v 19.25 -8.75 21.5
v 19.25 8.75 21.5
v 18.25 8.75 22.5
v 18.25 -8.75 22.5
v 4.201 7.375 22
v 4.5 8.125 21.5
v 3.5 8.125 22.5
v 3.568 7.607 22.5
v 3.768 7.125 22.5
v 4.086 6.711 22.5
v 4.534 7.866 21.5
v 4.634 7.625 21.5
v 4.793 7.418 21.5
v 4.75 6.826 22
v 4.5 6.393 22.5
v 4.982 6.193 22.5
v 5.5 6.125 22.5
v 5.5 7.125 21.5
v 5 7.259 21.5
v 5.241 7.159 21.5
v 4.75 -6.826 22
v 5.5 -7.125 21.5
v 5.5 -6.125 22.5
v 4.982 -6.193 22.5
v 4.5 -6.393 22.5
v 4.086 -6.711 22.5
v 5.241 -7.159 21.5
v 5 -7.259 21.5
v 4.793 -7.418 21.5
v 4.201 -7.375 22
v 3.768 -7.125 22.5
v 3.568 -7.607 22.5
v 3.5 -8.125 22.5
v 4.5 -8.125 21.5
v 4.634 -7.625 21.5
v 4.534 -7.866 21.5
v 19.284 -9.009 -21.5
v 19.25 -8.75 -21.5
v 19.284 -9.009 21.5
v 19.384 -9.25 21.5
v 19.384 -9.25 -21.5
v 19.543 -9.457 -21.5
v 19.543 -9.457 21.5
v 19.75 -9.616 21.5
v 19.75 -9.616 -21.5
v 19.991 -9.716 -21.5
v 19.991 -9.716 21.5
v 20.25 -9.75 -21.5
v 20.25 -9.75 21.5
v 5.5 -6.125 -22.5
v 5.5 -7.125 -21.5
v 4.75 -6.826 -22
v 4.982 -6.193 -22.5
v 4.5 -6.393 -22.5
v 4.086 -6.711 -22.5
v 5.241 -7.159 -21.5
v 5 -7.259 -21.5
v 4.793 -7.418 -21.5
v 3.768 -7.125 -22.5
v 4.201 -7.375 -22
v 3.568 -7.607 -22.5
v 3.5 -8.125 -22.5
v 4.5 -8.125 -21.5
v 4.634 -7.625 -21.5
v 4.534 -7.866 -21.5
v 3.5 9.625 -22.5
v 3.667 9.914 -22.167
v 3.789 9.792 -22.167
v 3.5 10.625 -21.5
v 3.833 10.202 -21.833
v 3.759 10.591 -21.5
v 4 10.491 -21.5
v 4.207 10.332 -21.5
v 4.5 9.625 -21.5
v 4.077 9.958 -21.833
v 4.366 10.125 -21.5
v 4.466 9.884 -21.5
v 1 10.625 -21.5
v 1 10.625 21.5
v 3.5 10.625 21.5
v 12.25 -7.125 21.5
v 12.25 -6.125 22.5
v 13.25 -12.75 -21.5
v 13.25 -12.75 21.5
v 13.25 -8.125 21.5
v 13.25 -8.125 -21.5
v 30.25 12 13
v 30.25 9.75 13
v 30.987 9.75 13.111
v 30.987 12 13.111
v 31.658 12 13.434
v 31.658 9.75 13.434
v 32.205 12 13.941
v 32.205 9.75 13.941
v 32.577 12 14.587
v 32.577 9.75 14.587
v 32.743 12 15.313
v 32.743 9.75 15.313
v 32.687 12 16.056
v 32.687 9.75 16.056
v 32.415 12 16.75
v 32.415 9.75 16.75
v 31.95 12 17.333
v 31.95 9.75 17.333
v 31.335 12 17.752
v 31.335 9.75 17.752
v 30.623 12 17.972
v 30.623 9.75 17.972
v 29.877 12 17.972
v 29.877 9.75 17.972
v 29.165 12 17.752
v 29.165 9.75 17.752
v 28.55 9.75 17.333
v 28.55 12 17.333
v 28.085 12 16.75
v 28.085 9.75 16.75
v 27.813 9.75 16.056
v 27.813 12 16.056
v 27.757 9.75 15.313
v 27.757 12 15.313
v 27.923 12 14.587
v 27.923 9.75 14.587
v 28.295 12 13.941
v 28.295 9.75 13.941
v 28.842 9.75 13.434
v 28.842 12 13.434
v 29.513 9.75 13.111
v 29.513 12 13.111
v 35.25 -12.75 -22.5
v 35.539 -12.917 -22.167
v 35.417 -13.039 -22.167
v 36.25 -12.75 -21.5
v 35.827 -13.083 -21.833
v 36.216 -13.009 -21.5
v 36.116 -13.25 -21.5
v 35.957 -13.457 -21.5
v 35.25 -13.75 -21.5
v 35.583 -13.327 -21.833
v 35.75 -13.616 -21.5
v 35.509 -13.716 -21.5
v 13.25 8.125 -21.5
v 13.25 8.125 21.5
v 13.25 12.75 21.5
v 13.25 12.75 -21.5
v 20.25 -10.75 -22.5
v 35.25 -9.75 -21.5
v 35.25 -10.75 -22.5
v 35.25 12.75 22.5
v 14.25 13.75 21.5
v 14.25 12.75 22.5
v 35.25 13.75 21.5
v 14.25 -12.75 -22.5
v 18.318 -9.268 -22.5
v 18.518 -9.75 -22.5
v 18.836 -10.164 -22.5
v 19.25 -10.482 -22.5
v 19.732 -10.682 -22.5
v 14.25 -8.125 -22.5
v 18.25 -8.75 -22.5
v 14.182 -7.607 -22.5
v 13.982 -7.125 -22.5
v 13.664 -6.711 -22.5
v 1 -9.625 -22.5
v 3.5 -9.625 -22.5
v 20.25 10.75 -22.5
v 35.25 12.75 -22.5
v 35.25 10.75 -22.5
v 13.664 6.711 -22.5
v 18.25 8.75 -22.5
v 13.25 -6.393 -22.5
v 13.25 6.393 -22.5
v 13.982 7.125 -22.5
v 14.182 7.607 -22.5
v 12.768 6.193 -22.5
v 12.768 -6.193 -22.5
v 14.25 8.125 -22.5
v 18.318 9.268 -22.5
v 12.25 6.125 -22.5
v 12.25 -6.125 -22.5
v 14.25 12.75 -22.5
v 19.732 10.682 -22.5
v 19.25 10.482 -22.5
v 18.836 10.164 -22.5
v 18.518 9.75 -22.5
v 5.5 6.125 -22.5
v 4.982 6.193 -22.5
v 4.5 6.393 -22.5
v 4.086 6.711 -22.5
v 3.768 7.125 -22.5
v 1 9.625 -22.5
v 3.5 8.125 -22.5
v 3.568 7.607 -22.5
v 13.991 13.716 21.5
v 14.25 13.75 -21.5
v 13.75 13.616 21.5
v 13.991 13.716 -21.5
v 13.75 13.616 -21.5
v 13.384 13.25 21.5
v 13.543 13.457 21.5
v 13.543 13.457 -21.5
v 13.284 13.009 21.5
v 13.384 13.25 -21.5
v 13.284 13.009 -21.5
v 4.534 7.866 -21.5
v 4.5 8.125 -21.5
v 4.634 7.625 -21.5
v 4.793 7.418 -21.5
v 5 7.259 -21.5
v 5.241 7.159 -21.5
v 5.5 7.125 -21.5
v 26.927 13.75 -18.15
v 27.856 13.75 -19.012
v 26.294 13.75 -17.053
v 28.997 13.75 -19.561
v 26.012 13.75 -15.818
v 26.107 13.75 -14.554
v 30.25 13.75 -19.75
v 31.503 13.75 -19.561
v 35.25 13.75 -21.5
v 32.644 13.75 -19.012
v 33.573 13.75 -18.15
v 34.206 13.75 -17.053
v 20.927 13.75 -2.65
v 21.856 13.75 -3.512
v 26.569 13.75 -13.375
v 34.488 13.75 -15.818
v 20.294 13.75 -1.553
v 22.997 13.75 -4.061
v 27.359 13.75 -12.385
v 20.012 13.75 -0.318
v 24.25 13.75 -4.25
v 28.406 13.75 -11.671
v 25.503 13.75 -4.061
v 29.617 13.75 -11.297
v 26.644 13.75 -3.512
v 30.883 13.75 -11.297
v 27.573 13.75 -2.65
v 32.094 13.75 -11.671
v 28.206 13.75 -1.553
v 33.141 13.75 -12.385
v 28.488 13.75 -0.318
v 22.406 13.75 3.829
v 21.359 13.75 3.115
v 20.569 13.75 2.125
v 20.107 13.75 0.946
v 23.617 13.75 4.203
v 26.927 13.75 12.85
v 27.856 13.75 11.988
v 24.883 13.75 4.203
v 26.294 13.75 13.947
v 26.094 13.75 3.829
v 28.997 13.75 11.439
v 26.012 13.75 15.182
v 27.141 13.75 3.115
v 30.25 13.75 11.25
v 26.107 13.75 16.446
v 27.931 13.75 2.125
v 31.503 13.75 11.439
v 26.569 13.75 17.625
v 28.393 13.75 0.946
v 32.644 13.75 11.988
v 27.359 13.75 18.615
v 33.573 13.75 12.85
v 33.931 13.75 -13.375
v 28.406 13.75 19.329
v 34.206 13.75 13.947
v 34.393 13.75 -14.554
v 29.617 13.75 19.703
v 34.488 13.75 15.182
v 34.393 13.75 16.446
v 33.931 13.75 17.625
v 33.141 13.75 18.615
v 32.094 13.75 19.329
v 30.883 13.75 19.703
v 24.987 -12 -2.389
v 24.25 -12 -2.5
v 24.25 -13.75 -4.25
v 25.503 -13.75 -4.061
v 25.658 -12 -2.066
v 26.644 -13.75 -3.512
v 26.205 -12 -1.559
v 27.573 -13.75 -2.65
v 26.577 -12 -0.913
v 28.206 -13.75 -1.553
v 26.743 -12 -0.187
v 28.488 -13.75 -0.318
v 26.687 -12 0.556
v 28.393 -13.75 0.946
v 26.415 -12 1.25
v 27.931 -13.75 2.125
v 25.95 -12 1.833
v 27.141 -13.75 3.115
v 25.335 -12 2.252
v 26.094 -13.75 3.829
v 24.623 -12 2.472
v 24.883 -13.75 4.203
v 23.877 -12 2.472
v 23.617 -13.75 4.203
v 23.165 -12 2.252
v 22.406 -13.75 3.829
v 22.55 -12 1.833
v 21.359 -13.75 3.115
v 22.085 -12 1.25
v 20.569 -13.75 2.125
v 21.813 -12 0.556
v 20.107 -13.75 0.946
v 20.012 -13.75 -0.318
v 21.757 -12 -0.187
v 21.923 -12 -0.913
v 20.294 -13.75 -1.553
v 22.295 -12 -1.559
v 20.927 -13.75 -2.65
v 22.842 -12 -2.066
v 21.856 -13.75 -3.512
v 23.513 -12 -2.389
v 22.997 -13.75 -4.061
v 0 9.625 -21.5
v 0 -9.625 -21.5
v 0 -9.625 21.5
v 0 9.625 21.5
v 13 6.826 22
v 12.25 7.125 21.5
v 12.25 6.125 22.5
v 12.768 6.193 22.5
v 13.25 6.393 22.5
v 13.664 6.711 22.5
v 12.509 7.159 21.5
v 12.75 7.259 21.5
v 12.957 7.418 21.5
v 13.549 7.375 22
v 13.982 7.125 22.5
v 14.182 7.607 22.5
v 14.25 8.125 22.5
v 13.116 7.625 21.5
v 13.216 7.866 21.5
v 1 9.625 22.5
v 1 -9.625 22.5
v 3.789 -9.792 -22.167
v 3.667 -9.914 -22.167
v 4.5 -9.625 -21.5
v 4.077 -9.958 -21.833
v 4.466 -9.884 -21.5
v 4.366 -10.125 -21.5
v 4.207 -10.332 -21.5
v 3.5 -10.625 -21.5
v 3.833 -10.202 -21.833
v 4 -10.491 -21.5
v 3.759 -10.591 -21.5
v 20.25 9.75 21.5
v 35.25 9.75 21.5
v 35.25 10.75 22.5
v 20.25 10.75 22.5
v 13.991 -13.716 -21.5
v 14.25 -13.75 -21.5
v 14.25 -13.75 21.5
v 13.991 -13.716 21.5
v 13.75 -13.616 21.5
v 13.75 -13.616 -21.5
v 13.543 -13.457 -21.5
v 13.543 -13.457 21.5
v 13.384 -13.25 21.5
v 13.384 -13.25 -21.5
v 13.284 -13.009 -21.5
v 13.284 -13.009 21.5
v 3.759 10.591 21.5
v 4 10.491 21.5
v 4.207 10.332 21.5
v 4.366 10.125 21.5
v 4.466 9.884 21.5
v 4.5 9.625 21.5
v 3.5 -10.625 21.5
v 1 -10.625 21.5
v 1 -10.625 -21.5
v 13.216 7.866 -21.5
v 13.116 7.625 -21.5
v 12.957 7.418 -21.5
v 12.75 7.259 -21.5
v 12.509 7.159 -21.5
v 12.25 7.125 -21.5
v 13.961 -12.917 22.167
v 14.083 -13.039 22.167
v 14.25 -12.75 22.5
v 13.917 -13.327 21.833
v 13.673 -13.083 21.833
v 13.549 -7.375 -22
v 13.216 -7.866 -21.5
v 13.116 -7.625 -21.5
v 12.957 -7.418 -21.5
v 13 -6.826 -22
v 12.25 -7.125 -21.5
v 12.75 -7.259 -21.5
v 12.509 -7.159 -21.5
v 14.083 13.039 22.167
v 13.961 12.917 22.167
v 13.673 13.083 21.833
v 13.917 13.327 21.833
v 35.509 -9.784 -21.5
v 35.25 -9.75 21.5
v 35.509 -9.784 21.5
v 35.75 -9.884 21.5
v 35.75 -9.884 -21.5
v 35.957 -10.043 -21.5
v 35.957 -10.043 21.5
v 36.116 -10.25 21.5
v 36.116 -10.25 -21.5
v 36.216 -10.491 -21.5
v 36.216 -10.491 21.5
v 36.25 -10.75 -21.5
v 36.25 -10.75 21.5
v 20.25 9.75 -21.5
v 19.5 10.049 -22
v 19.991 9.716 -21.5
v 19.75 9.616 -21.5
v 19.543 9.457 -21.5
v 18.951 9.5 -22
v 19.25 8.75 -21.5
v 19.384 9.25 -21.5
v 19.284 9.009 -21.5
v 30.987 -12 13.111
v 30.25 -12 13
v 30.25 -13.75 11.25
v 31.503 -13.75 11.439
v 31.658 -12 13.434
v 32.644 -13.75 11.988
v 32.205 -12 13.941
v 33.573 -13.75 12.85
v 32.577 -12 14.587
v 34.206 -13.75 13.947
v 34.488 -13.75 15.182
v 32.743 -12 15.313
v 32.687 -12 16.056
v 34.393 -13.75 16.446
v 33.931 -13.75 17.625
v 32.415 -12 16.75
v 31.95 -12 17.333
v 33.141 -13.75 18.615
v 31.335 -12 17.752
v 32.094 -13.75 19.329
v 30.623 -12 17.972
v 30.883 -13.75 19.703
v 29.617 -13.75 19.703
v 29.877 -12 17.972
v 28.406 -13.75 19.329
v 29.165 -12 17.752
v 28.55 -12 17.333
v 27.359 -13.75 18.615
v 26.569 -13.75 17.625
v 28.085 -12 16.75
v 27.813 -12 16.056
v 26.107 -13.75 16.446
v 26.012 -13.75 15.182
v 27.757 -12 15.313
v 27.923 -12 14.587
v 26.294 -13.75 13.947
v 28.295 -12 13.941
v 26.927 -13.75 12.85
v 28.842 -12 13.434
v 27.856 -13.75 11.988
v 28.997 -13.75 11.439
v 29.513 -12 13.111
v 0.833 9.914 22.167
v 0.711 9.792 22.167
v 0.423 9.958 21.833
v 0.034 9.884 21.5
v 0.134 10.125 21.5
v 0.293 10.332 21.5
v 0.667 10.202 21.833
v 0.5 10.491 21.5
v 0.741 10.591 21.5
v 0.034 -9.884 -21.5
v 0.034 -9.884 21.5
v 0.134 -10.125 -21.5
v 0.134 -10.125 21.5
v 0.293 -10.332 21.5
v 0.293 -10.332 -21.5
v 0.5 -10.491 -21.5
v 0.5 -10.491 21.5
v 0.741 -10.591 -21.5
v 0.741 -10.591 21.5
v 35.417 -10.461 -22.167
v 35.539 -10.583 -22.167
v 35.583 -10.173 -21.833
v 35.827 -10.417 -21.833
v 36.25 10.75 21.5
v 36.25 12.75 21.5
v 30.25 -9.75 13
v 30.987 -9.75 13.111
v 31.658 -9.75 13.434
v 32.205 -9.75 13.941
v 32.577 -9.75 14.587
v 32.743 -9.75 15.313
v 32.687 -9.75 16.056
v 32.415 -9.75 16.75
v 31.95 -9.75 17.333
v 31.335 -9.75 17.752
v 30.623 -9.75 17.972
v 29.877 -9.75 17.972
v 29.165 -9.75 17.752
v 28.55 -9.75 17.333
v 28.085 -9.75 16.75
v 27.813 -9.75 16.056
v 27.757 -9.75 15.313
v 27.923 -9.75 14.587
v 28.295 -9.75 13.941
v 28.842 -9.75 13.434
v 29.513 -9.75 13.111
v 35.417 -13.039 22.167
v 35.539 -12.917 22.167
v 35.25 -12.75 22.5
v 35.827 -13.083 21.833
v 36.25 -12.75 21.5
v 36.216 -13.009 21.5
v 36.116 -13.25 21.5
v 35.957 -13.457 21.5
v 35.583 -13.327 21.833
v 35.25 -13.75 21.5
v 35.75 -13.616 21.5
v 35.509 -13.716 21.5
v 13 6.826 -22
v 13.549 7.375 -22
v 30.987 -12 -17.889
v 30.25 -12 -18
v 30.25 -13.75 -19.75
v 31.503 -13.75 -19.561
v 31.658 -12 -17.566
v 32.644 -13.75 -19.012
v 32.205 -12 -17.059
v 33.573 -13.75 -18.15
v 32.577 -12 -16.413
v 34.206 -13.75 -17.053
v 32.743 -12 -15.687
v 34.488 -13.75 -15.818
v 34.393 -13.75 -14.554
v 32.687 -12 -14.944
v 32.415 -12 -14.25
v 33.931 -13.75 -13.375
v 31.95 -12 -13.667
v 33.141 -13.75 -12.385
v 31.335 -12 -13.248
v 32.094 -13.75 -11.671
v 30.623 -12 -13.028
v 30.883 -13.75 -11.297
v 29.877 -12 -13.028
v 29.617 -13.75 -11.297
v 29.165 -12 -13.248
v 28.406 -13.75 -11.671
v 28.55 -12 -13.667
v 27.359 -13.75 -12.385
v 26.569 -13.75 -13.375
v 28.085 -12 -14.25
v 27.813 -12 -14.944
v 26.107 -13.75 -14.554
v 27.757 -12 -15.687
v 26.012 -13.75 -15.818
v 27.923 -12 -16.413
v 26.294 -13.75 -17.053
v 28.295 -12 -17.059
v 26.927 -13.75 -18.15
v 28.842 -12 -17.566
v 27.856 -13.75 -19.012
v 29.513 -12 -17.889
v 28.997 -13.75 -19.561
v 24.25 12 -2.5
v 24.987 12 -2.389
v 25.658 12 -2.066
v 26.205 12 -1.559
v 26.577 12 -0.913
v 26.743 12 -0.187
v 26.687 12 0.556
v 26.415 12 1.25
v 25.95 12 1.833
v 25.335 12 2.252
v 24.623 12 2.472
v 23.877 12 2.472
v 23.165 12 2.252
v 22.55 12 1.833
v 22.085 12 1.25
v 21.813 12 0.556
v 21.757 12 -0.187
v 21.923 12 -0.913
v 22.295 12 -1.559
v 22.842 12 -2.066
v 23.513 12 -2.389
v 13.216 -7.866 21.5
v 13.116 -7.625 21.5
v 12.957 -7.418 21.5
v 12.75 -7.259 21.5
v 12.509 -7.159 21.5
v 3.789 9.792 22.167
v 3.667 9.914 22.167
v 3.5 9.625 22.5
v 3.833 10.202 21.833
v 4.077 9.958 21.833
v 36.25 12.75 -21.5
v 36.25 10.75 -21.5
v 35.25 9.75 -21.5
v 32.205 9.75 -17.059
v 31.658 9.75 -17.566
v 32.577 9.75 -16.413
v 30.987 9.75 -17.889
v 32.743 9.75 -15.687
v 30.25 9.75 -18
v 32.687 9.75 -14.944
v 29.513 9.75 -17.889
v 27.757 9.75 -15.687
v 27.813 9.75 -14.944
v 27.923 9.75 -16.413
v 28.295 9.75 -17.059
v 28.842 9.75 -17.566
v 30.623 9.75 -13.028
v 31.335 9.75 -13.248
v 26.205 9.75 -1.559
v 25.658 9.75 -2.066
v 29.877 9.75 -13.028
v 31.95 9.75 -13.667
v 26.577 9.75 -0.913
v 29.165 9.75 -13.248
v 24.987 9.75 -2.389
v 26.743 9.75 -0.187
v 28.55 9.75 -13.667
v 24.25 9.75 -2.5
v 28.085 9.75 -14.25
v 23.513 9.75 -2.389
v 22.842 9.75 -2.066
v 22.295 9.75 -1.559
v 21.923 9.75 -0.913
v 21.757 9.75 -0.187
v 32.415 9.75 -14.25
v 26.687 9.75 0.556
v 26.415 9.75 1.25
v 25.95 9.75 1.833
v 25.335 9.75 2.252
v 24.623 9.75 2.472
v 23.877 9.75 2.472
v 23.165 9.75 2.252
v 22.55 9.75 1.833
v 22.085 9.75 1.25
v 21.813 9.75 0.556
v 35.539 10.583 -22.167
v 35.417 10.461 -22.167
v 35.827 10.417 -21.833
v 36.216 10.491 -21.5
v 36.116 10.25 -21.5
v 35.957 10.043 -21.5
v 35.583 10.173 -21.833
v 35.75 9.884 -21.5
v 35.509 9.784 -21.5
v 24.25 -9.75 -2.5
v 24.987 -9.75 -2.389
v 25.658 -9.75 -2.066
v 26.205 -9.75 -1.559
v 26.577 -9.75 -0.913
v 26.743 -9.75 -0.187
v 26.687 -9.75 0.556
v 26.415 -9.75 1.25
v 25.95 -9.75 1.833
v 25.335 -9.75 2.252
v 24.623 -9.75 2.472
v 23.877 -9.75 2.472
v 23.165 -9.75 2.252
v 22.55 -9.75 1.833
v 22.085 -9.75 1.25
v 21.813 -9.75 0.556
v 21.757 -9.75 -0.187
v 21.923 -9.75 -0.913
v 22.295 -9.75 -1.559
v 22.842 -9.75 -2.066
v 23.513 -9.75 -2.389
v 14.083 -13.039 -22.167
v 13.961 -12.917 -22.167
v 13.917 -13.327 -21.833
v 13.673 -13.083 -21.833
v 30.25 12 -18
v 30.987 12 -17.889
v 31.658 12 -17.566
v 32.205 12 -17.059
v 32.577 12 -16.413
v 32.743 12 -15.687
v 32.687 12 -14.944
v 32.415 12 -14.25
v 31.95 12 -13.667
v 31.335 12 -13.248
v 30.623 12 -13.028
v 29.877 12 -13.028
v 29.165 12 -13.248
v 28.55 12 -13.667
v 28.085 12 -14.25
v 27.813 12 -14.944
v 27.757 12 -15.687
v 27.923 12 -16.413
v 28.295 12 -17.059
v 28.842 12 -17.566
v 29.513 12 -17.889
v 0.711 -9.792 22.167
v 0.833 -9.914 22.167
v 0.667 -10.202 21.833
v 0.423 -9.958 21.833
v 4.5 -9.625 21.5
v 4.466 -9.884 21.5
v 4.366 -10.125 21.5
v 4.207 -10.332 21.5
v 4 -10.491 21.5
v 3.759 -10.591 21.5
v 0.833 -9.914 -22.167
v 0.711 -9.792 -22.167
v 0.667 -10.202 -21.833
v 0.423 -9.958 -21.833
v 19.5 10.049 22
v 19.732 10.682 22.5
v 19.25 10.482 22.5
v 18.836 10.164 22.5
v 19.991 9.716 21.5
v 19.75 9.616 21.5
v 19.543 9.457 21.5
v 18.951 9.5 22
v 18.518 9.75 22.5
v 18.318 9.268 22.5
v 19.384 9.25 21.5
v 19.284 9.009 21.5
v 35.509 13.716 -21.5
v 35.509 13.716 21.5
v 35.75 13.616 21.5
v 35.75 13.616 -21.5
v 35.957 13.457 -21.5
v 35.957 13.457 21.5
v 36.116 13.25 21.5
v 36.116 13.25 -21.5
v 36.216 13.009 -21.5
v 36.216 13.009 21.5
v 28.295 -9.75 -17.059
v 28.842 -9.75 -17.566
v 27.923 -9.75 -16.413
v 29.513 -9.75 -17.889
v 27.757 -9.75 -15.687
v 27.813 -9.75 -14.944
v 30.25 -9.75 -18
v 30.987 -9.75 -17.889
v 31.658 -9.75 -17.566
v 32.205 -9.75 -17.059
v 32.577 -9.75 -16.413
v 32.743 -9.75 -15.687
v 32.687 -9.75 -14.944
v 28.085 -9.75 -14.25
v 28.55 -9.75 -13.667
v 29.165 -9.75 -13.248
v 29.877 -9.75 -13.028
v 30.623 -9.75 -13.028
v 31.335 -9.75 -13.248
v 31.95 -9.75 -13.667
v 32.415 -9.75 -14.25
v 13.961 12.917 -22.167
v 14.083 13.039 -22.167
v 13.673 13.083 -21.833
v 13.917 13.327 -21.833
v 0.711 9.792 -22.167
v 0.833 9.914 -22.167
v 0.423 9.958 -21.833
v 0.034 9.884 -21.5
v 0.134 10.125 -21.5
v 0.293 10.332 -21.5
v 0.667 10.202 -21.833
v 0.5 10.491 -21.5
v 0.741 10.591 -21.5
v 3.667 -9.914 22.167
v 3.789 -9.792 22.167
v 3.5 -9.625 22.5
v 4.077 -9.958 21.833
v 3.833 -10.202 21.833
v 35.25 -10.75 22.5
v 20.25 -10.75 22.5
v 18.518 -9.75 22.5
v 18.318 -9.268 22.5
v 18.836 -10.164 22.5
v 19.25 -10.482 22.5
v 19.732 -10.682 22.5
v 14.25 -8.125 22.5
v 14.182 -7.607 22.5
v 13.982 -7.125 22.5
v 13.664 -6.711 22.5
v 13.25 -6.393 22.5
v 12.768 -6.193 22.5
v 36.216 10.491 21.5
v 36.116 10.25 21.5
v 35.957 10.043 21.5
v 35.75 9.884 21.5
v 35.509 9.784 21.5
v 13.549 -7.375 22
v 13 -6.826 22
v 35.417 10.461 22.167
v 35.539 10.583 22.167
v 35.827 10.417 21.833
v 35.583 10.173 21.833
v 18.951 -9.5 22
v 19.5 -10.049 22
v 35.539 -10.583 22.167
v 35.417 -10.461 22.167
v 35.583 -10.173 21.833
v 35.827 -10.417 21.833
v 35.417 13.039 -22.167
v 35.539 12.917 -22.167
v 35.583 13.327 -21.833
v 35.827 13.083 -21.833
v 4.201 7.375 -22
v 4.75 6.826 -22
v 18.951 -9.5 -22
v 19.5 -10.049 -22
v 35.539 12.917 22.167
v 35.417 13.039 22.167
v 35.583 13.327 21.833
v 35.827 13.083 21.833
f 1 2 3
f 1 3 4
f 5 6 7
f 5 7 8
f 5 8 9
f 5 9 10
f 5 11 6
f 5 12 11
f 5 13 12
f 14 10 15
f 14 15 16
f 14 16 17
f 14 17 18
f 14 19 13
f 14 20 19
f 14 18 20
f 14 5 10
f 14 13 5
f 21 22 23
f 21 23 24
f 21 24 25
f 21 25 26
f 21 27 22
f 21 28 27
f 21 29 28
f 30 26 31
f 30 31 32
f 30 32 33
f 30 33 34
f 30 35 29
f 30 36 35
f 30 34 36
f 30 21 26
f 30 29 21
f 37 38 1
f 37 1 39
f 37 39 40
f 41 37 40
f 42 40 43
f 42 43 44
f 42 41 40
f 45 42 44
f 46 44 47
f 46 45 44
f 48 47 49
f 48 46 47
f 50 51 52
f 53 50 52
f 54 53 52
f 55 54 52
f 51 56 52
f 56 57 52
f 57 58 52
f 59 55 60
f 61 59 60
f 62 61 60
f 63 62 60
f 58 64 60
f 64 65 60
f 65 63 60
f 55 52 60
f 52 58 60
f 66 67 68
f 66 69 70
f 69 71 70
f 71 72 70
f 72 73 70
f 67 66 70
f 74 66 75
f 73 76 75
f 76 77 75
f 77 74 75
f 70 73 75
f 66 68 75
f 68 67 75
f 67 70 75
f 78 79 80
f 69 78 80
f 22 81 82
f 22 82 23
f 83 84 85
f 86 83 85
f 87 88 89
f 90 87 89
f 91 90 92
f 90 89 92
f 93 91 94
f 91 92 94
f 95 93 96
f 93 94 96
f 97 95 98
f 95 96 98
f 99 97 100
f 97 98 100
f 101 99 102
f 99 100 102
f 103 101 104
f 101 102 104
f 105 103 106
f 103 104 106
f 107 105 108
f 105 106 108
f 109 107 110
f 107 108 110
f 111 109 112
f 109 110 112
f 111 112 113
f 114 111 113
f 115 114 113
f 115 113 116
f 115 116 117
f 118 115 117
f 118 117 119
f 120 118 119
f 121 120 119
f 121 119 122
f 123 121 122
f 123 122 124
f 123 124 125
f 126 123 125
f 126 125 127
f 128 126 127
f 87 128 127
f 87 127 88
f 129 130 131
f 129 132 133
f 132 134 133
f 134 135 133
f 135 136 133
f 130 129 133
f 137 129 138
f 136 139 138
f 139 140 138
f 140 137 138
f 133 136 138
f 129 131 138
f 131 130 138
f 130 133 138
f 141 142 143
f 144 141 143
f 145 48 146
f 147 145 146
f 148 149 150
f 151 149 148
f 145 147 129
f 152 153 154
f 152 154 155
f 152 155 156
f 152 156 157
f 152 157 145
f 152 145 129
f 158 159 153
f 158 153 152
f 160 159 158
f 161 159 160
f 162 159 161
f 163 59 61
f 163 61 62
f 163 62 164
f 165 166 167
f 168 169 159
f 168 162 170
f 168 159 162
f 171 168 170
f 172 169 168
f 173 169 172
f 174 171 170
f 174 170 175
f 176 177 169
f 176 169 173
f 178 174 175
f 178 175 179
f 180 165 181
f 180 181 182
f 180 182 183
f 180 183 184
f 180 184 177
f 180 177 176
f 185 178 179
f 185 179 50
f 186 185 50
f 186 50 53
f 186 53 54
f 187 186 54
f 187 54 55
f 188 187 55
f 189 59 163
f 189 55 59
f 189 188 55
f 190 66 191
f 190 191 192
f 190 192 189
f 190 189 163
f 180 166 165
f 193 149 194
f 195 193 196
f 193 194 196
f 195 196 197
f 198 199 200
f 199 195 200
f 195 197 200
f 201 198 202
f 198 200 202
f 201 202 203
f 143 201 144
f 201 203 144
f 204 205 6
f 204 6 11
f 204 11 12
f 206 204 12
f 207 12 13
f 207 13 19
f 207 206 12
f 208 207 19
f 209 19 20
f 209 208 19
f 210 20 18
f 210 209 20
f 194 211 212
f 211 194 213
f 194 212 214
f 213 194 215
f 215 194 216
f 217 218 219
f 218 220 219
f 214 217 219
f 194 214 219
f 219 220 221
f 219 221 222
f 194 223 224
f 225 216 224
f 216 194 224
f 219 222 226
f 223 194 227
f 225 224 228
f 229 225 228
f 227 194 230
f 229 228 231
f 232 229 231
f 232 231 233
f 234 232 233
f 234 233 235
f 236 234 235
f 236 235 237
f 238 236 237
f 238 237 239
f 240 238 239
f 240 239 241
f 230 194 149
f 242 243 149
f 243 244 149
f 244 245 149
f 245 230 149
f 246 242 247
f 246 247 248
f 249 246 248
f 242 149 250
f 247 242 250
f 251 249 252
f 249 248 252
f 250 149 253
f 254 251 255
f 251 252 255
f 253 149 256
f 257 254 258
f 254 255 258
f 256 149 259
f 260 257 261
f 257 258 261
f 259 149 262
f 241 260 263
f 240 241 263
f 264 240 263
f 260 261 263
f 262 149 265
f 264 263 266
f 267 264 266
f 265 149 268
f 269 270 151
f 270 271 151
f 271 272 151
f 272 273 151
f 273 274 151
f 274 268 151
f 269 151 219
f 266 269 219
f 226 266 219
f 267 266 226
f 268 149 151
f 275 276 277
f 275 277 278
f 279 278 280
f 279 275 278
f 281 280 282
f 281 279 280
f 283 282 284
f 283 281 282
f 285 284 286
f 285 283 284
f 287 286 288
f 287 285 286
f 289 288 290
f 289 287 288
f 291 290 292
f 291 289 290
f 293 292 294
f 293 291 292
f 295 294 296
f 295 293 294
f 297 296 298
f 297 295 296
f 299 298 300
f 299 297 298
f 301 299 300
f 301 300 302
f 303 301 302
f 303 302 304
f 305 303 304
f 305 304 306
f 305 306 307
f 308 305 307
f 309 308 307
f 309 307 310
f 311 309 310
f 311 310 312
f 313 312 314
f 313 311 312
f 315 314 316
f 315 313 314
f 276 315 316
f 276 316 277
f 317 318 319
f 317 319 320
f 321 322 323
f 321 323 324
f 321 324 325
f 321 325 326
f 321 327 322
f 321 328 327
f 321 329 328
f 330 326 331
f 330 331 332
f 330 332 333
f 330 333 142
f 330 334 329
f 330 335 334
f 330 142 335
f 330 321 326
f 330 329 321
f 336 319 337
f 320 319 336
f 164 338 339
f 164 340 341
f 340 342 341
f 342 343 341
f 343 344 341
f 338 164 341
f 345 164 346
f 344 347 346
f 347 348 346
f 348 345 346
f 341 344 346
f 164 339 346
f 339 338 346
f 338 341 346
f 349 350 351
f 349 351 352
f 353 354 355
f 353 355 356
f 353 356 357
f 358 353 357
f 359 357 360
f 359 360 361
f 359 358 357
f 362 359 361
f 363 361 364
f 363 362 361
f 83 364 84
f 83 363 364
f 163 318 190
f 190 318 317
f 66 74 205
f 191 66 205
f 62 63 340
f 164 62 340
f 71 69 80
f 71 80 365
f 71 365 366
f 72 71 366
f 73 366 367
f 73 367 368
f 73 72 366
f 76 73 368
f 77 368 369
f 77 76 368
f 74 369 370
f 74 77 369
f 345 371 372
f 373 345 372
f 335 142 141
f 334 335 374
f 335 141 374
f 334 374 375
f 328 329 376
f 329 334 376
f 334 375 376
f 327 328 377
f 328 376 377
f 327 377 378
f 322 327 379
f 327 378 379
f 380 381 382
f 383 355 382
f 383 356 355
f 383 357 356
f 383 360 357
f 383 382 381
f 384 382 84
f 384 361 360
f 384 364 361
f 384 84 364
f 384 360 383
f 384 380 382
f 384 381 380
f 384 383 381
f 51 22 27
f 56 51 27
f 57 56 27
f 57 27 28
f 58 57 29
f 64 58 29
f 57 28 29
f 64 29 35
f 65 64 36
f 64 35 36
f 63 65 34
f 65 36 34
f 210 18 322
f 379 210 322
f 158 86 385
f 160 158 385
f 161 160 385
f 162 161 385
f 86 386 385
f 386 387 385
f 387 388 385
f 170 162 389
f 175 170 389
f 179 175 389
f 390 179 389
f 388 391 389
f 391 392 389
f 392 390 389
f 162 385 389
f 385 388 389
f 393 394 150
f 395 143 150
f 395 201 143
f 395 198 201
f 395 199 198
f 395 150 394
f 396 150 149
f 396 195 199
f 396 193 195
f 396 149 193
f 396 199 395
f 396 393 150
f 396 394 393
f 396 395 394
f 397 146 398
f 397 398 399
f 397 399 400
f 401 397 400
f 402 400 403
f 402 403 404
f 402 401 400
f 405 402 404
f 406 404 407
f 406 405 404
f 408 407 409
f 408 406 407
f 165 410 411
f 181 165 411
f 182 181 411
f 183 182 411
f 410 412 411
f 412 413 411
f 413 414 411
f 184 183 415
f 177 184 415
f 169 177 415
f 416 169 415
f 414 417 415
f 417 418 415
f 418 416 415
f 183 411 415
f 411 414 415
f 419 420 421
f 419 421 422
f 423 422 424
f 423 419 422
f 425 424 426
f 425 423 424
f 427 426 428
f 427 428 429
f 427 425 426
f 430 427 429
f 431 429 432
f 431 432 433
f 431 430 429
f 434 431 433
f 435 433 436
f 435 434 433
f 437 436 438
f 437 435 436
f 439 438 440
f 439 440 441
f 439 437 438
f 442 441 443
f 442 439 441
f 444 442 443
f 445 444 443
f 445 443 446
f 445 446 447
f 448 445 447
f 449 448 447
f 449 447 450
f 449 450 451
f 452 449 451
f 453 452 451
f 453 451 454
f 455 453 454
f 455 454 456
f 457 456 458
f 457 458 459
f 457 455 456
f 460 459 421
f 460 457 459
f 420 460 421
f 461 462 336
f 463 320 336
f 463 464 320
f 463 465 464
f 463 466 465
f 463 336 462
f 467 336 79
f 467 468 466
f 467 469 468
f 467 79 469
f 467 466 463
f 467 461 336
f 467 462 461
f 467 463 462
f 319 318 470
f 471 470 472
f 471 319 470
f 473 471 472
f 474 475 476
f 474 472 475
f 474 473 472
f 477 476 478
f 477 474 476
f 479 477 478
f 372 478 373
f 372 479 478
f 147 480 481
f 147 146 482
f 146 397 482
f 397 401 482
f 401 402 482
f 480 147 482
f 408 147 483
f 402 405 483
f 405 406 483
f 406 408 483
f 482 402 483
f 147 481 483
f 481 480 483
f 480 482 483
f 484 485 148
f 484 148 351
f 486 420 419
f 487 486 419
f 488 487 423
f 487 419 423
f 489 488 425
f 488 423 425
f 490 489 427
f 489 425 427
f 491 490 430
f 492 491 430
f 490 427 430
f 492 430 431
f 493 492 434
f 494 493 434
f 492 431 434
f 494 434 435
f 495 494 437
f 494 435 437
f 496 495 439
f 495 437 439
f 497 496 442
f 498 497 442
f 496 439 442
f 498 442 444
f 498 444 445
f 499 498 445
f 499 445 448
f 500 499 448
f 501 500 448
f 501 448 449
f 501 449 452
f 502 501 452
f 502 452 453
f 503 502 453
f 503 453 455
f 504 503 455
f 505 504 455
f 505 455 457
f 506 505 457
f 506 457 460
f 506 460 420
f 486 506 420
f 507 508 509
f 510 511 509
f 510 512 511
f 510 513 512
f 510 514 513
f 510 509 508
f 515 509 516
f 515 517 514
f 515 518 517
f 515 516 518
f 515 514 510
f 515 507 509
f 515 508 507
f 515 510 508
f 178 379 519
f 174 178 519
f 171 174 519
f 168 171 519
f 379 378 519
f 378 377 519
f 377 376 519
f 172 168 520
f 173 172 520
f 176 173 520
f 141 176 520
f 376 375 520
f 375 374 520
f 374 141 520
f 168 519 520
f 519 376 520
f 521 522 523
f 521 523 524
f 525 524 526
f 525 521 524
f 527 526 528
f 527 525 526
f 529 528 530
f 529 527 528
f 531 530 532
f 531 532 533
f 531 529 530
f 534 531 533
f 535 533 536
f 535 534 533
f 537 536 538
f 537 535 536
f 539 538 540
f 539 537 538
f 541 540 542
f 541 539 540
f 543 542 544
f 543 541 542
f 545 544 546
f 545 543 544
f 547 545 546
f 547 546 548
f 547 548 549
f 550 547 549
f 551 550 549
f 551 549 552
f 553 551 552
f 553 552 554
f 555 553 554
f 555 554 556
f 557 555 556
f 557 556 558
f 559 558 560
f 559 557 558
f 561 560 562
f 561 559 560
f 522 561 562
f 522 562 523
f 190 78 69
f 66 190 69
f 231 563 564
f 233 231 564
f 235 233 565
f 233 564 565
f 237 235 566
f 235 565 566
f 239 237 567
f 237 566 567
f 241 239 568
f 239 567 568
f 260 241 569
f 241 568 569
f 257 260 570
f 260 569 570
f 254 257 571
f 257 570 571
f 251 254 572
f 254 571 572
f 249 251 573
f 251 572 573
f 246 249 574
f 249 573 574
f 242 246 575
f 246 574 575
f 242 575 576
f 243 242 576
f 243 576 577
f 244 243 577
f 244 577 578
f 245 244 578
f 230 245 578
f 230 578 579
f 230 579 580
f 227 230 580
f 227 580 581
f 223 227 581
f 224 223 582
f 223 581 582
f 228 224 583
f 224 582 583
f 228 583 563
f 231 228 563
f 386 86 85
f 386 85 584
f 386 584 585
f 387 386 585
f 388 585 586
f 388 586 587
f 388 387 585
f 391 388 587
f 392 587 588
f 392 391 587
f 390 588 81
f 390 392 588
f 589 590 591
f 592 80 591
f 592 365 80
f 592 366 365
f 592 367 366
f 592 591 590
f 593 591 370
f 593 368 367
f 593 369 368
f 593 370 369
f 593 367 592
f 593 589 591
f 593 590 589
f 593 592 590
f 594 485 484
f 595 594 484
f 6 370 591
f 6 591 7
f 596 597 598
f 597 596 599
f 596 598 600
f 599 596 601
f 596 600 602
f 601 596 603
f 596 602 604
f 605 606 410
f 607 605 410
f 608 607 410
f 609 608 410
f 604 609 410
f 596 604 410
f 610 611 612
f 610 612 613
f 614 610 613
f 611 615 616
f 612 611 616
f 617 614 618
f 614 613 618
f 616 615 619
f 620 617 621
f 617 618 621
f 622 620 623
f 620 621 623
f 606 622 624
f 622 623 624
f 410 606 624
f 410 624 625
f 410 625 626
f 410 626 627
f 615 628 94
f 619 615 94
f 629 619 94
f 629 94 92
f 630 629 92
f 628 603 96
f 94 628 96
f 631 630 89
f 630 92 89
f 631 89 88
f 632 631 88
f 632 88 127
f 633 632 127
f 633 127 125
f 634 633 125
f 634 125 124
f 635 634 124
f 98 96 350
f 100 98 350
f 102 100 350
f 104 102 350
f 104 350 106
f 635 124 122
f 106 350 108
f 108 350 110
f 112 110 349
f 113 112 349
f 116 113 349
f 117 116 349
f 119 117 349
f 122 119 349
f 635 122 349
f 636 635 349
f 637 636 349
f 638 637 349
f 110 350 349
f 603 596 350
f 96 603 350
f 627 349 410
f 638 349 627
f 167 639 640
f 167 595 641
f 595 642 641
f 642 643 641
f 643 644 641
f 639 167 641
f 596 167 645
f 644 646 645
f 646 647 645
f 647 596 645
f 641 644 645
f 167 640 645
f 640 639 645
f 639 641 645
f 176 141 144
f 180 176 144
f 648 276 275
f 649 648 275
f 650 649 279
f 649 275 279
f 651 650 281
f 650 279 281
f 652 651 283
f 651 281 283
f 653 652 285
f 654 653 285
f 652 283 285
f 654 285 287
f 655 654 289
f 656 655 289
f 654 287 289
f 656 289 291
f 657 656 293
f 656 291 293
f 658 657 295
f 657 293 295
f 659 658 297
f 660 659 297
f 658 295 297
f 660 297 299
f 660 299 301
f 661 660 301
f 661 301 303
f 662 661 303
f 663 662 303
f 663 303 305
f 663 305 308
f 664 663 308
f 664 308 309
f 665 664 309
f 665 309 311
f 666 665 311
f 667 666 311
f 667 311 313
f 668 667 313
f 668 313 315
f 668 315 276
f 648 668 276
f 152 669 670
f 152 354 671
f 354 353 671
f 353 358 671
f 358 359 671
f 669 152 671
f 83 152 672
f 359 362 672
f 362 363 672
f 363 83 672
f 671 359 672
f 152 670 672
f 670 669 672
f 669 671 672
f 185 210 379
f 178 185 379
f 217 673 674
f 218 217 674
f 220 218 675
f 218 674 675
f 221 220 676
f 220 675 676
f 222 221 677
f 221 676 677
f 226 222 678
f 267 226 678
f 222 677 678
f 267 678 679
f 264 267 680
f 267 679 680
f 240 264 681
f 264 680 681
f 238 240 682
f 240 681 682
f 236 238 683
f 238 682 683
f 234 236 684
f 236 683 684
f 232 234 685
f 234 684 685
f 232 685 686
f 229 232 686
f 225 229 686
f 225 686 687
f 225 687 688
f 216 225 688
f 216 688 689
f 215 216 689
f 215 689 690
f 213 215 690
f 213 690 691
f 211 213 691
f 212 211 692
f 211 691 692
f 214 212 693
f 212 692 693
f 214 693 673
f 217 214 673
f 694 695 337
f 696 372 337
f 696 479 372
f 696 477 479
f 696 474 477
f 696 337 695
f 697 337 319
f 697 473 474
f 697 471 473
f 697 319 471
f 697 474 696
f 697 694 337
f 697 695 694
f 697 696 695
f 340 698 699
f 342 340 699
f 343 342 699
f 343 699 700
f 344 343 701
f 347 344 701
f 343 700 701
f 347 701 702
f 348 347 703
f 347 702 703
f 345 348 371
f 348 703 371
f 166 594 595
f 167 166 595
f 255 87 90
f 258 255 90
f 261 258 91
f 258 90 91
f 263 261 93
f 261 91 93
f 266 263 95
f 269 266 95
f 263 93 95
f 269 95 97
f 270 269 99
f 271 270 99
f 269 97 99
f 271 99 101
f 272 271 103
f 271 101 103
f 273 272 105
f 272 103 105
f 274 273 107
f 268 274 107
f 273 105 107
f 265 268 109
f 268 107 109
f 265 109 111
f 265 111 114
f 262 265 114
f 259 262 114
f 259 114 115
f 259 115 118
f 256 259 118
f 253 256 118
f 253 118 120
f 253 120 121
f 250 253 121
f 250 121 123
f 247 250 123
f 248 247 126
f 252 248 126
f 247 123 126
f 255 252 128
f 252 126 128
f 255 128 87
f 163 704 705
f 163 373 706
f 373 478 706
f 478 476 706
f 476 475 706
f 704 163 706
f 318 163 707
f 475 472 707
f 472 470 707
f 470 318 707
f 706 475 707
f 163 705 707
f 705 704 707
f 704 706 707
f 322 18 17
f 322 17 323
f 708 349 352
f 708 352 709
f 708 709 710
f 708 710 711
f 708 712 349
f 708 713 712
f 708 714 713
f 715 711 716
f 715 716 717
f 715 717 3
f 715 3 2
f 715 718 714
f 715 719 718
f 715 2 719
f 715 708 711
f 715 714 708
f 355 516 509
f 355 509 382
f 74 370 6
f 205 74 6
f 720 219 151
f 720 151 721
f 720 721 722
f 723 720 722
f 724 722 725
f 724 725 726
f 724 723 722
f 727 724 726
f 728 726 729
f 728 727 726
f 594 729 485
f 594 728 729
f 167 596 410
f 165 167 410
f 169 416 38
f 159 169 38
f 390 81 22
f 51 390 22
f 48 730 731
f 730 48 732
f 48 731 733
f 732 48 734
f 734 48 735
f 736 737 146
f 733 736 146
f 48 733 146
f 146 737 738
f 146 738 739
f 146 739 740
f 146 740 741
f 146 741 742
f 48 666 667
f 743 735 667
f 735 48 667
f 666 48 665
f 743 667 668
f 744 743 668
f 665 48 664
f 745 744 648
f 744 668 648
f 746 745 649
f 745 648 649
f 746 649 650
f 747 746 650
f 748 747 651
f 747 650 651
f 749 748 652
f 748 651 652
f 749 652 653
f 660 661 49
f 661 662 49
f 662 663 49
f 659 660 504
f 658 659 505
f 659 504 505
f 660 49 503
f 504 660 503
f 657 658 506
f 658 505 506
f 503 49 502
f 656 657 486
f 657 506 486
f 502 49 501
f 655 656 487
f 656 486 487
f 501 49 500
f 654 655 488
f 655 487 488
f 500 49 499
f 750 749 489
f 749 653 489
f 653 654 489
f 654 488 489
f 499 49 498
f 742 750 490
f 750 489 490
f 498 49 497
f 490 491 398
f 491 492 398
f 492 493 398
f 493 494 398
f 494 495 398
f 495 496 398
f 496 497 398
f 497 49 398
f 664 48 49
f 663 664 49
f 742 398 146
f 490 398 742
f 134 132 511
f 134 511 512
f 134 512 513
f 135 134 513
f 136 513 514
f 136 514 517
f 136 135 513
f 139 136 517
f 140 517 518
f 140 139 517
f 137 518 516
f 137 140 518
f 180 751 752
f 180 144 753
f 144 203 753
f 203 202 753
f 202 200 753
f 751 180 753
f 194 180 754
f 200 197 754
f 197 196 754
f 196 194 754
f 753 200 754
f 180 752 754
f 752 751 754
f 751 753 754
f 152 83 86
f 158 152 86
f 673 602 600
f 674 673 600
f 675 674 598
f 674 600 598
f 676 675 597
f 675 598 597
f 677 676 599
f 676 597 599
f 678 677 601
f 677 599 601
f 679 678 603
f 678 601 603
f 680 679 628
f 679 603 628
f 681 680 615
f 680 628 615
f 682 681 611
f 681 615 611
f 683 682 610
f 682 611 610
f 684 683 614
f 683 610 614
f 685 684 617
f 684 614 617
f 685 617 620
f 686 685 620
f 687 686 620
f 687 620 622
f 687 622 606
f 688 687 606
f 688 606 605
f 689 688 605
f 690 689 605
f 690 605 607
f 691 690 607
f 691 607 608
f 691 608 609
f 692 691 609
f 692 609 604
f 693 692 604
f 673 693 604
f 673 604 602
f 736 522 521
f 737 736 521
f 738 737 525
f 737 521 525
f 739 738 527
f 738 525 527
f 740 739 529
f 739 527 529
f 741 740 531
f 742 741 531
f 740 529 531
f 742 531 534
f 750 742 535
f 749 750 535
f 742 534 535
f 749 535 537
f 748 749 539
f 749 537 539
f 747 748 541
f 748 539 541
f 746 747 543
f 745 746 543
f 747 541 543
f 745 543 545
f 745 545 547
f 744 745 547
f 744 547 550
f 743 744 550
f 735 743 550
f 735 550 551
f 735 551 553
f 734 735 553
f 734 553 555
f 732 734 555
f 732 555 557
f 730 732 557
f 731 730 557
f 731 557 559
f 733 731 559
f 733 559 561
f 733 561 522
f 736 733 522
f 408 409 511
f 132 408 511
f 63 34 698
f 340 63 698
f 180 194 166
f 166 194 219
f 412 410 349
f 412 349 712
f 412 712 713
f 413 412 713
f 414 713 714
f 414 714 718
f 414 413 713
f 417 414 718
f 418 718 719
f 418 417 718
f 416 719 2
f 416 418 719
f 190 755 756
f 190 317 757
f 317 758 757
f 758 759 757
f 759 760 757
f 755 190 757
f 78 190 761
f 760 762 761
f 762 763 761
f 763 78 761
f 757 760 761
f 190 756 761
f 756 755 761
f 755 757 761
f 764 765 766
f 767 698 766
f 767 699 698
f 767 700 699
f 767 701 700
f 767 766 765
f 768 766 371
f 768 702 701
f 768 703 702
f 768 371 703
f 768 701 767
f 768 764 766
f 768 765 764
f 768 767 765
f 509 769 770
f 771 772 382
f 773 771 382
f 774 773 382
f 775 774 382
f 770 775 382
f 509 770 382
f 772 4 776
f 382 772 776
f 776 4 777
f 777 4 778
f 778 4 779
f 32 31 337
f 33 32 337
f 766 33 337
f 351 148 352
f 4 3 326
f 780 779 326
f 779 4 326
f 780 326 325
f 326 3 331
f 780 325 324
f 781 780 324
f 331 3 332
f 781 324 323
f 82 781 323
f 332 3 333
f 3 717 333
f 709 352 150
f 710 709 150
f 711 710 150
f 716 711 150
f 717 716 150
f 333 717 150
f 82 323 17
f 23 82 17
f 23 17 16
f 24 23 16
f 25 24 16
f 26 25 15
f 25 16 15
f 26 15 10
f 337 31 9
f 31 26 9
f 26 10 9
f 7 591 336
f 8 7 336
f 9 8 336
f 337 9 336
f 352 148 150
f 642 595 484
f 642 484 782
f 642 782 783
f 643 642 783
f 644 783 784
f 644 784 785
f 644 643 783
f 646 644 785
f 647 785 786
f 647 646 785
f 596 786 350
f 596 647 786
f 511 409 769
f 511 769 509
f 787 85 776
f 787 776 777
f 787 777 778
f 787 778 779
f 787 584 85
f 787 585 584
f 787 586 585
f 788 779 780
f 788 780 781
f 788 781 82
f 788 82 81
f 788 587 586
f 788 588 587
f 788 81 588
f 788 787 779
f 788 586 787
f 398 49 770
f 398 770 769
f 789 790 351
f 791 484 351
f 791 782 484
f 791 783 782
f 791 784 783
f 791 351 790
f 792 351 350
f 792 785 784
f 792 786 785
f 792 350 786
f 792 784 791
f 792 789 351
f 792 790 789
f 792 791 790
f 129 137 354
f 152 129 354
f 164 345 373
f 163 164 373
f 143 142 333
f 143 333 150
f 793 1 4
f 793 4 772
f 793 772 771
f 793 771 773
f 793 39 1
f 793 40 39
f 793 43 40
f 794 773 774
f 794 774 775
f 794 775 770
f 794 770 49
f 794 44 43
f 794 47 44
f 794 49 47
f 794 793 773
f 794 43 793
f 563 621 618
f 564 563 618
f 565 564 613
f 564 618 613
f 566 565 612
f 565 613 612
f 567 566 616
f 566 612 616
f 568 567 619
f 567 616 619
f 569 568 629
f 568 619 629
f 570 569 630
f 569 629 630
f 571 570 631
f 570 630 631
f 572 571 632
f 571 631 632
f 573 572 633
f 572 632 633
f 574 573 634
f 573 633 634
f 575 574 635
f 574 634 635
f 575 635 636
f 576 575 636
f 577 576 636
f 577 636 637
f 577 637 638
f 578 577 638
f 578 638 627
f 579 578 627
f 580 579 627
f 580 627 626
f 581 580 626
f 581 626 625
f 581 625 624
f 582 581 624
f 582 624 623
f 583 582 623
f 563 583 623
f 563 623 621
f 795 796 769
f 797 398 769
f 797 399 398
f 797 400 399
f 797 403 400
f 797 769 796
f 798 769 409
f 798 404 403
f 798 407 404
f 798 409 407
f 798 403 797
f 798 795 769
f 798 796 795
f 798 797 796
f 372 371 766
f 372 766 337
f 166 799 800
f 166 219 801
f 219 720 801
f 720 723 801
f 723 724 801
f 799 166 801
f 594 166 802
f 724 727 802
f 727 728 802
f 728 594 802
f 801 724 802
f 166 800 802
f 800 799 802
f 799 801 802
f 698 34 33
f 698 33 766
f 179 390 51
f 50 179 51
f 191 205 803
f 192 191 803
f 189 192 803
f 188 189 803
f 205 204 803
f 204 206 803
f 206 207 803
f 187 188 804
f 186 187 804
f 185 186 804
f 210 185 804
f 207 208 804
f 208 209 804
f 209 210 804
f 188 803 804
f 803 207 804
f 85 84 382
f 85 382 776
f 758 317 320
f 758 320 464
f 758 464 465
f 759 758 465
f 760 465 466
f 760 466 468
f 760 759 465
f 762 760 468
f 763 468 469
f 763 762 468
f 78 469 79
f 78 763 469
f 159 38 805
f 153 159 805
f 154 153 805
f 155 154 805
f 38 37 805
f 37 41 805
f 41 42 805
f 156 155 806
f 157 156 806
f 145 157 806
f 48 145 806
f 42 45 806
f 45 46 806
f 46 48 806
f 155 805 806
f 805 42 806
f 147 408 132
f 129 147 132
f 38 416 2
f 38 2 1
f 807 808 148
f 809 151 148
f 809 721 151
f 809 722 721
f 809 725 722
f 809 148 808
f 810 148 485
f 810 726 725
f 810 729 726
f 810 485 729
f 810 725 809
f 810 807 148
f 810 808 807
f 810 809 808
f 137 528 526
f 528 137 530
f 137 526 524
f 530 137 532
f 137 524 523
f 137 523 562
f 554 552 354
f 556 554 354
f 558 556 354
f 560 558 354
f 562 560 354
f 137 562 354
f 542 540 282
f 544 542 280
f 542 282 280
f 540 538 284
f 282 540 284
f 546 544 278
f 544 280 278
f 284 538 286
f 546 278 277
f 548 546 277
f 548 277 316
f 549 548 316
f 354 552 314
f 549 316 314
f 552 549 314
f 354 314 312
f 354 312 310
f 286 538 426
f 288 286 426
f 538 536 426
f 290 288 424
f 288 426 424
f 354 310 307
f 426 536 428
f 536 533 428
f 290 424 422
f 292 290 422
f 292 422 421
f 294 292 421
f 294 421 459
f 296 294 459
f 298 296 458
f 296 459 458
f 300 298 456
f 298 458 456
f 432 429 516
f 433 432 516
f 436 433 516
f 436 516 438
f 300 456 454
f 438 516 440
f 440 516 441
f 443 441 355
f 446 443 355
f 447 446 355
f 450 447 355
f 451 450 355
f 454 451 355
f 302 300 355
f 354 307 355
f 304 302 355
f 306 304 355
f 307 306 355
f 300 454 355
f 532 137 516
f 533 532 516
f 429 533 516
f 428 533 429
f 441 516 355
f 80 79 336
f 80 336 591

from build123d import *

# Parameters (mm, degrees)
BOSS_EXTRUDE1_DEPTH = 22.5
SKETCH2_R           = 2.5
CUT_EXTRUDE1_DEPTH  = 51.759851261
CHAMFER1_SIZE       = 1.75
FILLET1_R           = 1
CHAMFER2_SIZE       = 1


with BuildPart() as part:
    # Sketch1 → Boss-Extrude1 (new, symmetric)
    with BuildSketch(Plane.XY):
        Polygon((0, -10.625), (0, 10.625), (4.5, 10.625), (4.5, 7.125), (13.25, 7.125), (13.25, 13.75), (36.25, 13.75), (36.25, 9.75), (19.25, 9.75), (19.25, -9.75), (36.25, -9.75), (36.25, -13.75), (13.25, -13.75), (13.25, -7.125), (4.5, -7.125), (4.5, -10.625), align=None)
    extrude(amount=BOSS_EXTRUDE1_DEPTH, both=True)

    # Sketch2 → Cut-Extrude1 (cut, through all)
    with BuildSketch(Plane.XZ.offset(13.75)):
        with Locations(Location((30.25, 15.5, 0), (0, 0, 270))):
            Circle(SKETCH2_R)
        with Locations(Location((24.25, 0, 0), (0, 0, 270))):
            Circle(SKETCH2_R)
        with Locations(Location((30.25, -15.5, 0), (0, 0, 270))):
            Circle(SKETCH2_R)
    extrude(amount=-CUT_EXTRUDE1_DEPTH, mode=Mode.SUBTRACT)

    # Chamfer1
    chamfer1_edges = [part.edges().sort_by_distance(p)[0] for p in [
        (30.25, 13.75, 18),
        (30.25, -13.75, 18),
        (24.25, 13.75, 2.5),
        (24.25, -13.75, 2.5),
        (30.25, 13.75, -13),
        (30.25, -13.75, -13),
    ]]
    chamfer(chamfer1_edges, length=CHAMFER1_SIZE)

    # Fillet1
    fillet1_edges = [part.edges().sort_by_distance(p)[0] for p in [
        (4.5, 10.625, 0),
        (4.5, 7.125, 0),
        (13.25, 7.125, 0),
        (13.25, 13.75, 0),
        (36.25, 13.75, 0),
        (36.25, 9.75, 0),
        (19.25, 9.75, 0),
        (19.25, -9.75, 0),
        (36.25, -9.75, 0),
        (36.25, -13.75, 0),
        (13.25, -13.75, 0),
        (13.25, -7.125, 0),
        (4.5, -7.125, 0),
        (4.5, -10.625, 0),
        (0, -10.625, 0),
        (0, 10.625, 0),
    ]]
    fillet(fillet1_edges, radius=FILLET1_R)

    # Chamfer2
    chamfer2_edges = [part.edges().sort_by_distance(p)[0] for p in [
        (0, 0, -22.5),
        (4.207106781, -10.332106781, -22.5),
        (0.292893219, 10.332106781, -22.5),
        (0.292893219, -10.332106781, -22.5),
        (13.542893219, -13.457106781, -22.5),
        (35.957106781, -13.457106781, -22.5),
        (35.957106781, -10.042893219, -22.5),
        (35.957106781, 10.042893219, -22.5),
        (35.957106781, 13.457106781, -22.5),
        (13.542893219, 13.457106781, -22.5),
        (4.207106781, 10.332106781, -22.5),
        (4.5, 8.875, 22.5),
        (0, 0, 22.5),
        (2.25, -10.625, 22.5),
        (4.5, -8.875, 22.5),
        (8.875, -7.125, 22.5),
        (13.25, -10.4375, 22.5),
        (24.75, -13.75, 22.5),
        (36.25, -11.75, 22.5),
        (27.75, -9.75, 22.5),
        (19.25, 0, 22.5),
        (27.75, 9.75, 22.5),
        (36.25, 11.75, 22.5),
        (24.75, 13.75, 22.5),
        (13.25, 10.4375, 22.5),
        (8.875, 7.125, 22.5),
        (4.207106781, -10.332106781, 22.5),
        (0.292893219, 10.332106781, 22.5),
        (0.292893219, -10.332106781, 22.5),
        (13.542893219, -13.457106781, 22.5),
        (35.957106781, -13.457106781, 22.5),
        (35.957106781, -10.042893219, 22.5),
        (35.957106781, 10.042893219, 22.5),
        (35.957106781, 13.457106781, 22.5),
        (13.542893219, 13.457106781, 22.5),
        (4.207106781, 10.332106781, 22.5),
        (4.792893219, 7.417893219, -22.5),
        (4.792893219, 7.417893219, 22.5),
        (12.957106781, 7.417893219, -22.5),
        (12.957106781, 7.417893219, 22.5),
        (19.542893219, 9.457106781, -22.5),
        (19.542893219, 9.457106781, 22.5),
        (19.542893219, -9.457106781, -22.5),
        (19.542893219, -9.457106781, 22.5),
        (12.957106781, -7.417893219, -22.5),
        (12.957106781, -7.417893219, 22.5),
        (4.792893219, -7.417893219, -22.5),
        (4.792893219, -7.417893219, 22.5),
        (2.25, 10.625, -22.5),
        (2.25, 10.625, 22.5),
        (4.5, 8.875, -22.5),
        (8.875, 7.125, -22.5),
        (13.25, 10.4375, -22.5),
        (24.75, 13.75, -22.5),
        (36.25, 11.75, -22.5),
        (27.75, 9.75, -22.5),
        (19.25, 0, -22.5),
        (27.75, -9.75, -22.5),
        (36.25, -11.75, -22.5),
        (24.75, -13.75, -22.5),
        (13.25, -10.4375, -22.5),
        (8.875, -7.125, -22.5),
        (4.5, -8.875, -22.5),
        (2.25, -10.625, -22.5),
    ]]
    chamfer(chamfer2_edges, length=CHAMFER2_SIZE)


solid = part.part
